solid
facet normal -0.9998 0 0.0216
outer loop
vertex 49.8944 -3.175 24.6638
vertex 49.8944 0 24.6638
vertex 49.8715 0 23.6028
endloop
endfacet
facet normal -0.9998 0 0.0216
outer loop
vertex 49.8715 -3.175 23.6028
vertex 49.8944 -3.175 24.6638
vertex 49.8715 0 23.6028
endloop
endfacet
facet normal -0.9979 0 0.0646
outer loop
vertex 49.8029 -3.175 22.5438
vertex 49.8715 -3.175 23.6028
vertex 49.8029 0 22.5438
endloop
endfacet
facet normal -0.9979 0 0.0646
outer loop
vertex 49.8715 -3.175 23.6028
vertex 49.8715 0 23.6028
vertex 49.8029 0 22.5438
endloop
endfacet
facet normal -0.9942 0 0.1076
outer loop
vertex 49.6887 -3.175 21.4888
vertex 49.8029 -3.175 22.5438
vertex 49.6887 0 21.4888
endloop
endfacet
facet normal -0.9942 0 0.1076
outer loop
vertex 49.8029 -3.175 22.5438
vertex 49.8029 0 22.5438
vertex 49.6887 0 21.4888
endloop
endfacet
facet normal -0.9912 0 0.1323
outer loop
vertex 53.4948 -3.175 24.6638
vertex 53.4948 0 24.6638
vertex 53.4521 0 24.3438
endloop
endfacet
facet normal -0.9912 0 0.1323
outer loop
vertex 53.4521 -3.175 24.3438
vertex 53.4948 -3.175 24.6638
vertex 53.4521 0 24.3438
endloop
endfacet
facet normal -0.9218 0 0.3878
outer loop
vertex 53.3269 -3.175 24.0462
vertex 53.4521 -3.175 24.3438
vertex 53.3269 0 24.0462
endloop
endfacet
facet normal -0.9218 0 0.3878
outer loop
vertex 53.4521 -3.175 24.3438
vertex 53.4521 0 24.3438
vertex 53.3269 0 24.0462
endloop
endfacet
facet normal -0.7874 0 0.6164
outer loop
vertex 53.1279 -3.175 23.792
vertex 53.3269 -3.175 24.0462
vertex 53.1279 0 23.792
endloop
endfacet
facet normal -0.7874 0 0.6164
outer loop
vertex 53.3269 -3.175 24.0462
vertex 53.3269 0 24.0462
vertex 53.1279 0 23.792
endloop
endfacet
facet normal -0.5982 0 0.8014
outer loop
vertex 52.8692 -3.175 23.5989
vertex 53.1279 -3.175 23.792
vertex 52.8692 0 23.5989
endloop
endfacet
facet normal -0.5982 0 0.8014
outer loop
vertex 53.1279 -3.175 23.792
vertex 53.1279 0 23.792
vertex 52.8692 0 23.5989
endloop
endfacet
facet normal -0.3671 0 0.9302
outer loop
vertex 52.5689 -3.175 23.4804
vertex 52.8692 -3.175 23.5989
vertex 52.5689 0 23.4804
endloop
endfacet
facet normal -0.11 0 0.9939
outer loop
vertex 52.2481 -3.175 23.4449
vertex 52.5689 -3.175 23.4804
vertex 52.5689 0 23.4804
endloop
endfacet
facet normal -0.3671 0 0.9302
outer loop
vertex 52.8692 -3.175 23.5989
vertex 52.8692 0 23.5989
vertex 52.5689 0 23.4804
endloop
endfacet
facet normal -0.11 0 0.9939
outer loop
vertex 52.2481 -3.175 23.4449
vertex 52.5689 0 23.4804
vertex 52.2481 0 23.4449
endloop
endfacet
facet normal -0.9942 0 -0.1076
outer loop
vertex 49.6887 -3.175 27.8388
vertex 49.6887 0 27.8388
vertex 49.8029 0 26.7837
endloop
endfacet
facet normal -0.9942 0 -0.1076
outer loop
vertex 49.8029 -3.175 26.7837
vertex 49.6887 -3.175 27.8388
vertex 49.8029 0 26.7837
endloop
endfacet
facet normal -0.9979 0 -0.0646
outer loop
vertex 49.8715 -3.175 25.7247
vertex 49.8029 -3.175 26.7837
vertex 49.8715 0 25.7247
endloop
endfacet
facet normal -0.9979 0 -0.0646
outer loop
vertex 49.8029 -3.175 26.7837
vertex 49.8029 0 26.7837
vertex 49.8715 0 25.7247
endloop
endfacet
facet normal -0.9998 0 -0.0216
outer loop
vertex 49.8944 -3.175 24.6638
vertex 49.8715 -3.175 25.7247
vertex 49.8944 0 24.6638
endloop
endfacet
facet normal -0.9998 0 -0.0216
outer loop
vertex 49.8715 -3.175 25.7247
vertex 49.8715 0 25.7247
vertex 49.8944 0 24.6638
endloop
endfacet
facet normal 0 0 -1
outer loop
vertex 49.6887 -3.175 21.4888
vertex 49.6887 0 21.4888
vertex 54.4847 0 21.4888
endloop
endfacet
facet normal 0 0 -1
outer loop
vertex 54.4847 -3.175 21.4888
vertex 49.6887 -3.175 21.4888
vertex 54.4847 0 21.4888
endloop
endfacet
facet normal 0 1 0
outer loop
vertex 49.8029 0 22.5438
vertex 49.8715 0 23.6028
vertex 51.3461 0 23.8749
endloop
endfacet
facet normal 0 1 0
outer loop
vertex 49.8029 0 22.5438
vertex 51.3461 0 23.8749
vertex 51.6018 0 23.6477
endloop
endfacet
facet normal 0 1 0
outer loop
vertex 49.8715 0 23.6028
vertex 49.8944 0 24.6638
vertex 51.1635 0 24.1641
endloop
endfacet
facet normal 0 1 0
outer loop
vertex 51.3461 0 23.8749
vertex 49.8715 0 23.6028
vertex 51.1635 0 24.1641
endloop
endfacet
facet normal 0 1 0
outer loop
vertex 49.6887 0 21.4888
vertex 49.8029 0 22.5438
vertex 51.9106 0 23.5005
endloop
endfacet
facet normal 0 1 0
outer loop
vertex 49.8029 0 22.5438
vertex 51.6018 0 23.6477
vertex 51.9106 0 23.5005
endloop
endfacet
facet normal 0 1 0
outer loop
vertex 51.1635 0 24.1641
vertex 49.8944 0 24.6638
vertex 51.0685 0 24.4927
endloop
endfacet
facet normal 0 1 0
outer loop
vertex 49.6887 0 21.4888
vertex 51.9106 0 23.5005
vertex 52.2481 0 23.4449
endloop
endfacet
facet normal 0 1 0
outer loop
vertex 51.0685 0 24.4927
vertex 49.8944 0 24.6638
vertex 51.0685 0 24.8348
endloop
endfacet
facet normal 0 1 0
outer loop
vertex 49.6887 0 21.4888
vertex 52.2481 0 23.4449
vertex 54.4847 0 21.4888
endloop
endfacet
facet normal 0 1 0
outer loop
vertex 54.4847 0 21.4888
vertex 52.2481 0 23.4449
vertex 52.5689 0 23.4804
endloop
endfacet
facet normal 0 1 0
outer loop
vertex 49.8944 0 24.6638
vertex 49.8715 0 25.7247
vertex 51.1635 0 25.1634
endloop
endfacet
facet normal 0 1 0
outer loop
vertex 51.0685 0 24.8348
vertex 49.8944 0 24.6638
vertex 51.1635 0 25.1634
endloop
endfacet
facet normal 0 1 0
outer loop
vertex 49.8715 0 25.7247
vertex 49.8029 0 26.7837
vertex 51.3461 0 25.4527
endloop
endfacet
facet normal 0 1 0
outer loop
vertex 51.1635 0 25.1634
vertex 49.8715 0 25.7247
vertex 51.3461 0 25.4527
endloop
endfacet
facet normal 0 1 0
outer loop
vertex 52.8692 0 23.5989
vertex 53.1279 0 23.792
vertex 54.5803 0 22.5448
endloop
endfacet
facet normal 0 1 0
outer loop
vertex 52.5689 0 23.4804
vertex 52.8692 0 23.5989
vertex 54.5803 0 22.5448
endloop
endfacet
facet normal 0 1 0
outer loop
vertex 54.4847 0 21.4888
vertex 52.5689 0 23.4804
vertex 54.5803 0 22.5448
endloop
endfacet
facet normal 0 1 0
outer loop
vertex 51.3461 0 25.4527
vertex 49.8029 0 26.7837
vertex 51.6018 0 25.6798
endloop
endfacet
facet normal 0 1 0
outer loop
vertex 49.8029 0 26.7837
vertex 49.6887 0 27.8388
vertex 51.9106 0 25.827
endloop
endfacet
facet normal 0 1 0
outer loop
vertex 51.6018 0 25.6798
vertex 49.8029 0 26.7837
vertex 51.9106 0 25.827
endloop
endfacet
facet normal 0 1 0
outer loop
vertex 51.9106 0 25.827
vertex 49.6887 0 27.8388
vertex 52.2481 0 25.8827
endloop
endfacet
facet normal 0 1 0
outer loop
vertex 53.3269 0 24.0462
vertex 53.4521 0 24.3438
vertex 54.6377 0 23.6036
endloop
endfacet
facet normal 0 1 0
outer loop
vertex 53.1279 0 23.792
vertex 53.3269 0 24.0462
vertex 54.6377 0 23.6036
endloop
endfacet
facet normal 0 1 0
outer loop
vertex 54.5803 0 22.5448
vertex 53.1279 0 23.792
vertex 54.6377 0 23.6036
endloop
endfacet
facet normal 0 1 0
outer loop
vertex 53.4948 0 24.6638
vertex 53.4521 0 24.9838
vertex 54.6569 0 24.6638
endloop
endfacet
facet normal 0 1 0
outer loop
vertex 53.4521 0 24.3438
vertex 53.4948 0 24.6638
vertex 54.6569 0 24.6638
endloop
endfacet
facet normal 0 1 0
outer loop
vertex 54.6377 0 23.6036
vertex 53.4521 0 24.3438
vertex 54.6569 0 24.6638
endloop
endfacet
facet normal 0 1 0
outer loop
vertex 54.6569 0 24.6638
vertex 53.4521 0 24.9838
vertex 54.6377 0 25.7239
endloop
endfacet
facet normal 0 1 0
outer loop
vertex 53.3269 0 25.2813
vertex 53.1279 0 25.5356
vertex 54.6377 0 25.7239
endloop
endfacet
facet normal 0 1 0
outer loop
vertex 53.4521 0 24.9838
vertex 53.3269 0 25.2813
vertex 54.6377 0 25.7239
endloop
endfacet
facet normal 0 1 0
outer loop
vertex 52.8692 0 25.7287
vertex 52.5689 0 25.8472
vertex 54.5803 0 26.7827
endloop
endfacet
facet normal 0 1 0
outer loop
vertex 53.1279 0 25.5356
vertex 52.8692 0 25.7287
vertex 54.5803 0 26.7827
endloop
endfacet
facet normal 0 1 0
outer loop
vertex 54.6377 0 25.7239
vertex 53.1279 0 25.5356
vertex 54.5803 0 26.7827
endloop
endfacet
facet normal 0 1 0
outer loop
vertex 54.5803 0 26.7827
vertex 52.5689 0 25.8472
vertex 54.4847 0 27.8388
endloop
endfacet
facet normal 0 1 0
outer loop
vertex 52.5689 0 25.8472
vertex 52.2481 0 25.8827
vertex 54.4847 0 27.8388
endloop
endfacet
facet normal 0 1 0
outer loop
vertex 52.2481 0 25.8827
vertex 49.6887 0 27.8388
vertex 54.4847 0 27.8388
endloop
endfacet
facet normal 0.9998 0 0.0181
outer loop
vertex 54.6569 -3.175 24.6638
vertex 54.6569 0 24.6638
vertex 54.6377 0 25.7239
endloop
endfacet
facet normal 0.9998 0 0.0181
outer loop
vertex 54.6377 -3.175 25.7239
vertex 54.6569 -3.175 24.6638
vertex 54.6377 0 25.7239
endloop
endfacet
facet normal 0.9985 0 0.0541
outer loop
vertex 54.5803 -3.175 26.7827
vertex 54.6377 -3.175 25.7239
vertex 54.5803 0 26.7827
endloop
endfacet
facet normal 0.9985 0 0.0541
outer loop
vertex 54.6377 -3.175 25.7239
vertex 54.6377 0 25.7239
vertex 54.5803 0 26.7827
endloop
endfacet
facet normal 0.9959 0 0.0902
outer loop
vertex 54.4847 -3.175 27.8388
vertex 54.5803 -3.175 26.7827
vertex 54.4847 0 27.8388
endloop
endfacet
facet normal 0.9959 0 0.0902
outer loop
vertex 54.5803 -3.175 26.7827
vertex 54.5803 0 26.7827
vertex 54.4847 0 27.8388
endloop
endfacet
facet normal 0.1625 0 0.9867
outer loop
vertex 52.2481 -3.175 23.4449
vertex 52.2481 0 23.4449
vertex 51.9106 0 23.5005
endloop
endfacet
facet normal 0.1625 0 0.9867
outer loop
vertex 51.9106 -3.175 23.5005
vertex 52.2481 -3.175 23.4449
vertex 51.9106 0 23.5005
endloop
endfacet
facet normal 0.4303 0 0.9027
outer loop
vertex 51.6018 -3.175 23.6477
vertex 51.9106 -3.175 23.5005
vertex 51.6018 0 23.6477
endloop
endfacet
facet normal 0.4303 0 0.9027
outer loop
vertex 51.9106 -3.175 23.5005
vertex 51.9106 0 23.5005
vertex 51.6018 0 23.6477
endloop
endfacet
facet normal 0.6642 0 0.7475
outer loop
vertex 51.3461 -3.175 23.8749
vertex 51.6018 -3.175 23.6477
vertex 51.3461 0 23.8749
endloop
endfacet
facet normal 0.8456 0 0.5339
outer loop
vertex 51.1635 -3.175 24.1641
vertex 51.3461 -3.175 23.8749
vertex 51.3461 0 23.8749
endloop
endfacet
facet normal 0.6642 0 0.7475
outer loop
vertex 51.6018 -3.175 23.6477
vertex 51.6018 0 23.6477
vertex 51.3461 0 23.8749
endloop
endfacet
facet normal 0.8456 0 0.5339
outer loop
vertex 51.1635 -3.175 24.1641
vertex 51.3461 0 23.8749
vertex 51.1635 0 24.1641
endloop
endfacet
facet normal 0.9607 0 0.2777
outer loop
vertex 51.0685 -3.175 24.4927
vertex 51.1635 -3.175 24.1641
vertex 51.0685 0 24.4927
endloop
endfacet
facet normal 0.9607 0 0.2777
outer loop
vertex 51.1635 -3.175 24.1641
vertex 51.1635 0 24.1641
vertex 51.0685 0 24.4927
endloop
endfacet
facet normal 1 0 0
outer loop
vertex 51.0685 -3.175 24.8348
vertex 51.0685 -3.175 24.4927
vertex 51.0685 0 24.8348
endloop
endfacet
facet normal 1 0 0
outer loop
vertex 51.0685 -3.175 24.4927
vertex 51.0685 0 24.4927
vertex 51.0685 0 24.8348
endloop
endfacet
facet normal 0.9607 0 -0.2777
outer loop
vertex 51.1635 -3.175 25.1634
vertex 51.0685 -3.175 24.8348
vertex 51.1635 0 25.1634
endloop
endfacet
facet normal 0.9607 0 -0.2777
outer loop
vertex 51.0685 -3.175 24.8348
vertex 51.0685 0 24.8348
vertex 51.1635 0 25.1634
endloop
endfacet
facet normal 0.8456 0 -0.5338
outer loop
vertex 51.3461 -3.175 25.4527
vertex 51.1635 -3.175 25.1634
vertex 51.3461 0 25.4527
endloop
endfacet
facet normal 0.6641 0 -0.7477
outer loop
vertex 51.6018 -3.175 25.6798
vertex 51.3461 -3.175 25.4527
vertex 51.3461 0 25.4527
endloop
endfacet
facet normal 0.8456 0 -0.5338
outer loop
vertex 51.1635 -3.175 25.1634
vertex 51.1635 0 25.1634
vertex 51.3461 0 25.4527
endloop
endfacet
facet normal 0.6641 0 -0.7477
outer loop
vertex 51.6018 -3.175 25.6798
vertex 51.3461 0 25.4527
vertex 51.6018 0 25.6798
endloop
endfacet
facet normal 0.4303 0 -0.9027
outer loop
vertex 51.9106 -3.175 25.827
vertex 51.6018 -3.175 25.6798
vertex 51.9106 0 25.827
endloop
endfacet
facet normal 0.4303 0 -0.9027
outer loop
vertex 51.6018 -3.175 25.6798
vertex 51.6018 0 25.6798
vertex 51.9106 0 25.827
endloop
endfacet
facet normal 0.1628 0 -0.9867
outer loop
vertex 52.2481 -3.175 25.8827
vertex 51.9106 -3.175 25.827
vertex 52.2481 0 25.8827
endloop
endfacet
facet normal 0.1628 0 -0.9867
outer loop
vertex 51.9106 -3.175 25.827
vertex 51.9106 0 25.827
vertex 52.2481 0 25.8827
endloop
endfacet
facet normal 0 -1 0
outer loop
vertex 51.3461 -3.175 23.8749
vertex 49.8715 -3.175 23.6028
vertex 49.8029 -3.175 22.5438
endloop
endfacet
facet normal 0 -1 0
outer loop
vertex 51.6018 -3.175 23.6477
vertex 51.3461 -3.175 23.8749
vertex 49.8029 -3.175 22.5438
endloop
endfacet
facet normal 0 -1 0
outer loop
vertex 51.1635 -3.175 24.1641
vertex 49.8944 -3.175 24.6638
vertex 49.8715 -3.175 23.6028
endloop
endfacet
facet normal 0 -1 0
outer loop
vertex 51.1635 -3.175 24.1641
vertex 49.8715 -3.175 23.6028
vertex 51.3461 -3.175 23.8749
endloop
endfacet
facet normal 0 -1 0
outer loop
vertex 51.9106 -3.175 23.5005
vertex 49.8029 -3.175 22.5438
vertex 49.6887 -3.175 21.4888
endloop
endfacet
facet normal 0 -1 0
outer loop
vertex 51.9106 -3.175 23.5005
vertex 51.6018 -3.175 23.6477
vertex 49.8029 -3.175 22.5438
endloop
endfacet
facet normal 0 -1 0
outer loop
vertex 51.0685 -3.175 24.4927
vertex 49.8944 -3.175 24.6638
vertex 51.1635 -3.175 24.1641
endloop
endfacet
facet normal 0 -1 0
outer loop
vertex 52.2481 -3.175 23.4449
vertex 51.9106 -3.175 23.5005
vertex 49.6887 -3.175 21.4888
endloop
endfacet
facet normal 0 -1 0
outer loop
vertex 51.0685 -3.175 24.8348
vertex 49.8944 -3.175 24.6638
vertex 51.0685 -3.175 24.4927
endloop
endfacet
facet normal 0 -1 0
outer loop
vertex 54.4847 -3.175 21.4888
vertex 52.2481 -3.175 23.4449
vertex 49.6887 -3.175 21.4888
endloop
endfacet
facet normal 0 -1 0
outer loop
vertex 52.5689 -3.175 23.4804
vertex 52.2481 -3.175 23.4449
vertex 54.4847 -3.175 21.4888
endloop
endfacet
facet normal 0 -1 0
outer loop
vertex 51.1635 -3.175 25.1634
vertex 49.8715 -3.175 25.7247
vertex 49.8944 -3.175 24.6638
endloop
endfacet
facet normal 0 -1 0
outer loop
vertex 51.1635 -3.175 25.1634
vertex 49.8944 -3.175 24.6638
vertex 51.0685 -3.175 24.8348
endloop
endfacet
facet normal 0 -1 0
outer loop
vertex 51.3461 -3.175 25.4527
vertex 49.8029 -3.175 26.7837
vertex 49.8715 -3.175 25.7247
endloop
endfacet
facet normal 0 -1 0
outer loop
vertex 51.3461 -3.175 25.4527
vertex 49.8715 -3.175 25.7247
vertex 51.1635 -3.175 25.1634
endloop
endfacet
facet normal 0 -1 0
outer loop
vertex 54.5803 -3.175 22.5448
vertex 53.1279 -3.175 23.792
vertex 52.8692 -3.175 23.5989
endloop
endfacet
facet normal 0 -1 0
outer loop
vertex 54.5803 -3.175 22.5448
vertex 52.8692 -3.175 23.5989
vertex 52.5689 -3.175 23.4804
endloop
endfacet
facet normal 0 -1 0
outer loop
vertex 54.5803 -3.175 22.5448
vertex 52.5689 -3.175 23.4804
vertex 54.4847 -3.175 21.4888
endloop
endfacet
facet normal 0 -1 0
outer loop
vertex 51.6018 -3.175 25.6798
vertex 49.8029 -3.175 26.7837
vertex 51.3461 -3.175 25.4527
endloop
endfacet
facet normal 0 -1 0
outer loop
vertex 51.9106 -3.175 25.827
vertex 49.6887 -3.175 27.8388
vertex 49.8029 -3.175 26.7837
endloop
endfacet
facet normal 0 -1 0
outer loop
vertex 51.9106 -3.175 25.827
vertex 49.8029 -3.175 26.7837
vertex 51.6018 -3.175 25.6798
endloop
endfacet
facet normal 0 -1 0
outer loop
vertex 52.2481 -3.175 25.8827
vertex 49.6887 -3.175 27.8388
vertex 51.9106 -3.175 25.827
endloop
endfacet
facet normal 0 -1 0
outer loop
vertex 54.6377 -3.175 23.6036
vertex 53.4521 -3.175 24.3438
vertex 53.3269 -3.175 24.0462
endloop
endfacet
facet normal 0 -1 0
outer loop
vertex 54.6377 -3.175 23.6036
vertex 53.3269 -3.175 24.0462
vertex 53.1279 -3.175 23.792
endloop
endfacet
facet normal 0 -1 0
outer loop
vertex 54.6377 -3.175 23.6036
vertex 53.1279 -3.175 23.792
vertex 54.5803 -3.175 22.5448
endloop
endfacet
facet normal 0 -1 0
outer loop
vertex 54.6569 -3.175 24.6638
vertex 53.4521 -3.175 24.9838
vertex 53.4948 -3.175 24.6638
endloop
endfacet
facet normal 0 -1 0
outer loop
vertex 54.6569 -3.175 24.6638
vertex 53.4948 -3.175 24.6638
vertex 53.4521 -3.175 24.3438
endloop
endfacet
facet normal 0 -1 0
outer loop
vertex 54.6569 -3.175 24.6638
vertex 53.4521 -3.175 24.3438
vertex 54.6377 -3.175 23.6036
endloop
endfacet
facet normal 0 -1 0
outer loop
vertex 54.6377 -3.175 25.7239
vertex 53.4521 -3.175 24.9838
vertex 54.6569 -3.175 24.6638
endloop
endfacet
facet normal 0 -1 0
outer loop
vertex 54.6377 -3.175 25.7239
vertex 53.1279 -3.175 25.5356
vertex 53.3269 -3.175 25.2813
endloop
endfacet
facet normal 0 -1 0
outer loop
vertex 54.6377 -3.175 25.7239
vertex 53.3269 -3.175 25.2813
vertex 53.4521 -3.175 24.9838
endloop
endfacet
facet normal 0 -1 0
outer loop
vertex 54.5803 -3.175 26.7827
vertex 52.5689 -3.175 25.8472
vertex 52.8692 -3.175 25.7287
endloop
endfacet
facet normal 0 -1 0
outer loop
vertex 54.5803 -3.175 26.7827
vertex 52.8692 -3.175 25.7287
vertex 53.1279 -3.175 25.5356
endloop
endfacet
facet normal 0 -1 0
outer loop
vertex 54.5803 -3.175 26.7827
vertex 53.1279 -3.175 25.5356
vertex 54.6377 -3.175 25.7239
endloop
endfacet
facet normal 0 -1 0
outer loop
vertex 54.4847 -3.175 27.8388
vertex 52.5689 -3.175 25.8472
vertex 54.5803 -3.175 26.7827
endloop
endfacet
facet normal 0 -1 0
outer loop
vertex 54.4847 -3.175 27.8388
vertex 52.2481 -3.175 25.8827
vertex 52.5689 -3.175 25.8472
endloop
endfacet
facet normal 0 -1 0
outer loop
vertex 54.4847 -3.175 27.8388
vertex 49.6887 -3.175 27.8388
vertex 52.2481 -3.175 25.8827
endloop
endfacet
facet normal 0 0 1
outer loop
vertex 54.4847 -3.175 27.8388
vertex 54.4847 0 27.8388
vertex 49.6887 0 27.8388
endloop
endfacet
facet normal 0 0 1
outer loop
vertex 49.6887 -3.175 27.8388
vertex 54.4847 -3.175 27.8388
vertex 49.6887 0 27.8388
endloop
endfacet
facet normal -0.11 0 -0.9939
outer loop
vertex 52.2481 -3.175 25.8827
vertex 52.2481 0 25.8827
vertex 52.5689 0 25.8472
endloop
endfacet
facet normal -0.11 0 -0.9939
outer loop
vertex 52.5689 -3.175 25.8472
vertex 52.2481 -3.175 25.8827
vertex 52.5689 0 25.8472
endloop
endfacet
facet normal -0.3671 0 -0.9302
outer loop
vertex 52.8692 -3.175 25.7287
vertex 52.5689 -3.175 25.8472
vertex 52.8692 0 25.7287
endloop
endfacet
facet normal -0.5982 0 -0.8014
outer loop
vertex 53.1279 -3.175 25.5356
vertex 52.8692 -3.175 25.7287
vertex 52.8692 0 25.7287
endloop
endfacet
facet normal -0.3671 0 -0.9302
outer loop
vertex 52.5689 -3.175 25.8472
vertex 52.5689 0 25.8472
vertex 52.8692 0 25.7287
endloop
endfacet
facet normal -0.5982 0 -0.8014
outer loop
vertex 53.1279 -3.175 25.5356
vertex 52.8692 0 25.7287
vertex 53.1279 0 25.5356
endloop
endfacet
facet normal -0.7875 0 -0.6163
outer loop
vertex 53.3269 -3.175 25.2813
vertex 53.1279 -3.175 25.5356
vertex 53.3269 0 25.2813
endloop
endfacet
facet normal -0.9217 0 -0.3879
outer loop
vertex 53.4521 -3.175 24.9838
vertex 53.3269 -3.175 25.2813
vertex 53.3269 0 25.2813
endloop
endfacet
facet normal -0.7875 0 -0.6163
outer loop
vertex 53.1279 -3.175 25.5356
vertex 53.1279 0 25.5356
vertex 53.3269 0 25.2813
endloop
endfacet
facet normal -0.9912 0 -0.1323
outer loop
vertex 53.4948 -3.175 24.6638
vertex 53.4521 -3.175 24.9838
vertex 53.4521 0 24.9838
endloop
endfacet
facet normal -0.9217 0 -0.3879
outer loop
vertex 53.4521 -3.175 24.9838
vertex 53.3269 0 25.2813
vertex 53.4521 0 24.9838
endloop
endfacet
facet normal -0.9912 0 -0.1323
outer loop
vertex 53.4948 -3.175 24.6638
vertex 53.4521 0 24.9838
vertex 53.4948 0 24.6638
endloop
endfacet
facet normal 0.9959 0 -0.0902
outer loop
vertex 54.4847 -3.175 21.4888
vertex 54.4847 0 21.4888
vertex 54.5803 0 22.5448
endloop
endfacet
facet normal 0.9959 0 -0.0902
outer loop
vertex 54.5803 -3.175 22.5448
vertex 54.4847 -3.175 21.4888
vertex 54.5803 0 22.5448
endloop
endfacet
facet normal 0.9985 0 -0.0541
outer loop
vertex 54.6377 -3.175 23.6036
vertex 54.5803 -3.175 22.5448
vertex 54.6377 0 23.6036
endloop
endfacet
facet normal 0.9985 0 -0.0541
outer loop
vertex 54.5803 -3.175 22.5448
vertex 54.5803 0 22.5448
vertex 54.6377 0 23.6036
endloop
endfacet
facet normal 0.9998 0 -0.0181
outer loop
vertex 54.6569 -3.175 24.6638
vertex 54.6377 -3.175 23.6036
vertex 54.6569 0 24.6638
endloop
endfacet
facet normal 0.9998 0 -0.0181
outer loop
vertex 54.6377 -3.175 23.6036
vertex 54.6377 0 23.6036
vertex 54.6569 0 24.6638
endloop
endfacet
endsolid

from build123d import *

# Parameters (mm, degrees)
F1_DEPTH = 3.175


with BuildPart() as f1:
    # F0 (on Front) → F1 (new body)
    with BuildSketch(Plane.XZ):
        with BuildLine():
            Line((54.4847436749, 27.8387732587), (52.0882042376, 27.8387732587))
            ThreePointArc((52.0882042376, 27.8387732587), (52.1859300417, 26.8621715497), (52.248080123, 25.8826621838))
            ThreePointArc((52.248080123, 25.8826621838), (53.1279319628, 25.5355601855), (53.4948196995, 24.6637732587))
            ThreePointArc((53.4948196995, 24.6637732587), (53.1279319628, 23.7919863318), (52.248080123, 23.4448843336))
            ThreePointArc((52.248080123, 23.4448843336), (52.1859300417, 22.4653749676), (52.0882042376, 21.4887732587))
            Line((52.0882042376, 21.4887732587), (54.4847436749, 21.4887732587))
            ThreePointArc((54.4847436749, 21.4887732587), (54.6138066219, 23.0739421066), (54.6568696995, 24.6637732587))
            ThreePointArc((54.6568696995, 24.6637732587), (54.6138066219, 26.2536044107), (54.4847436749, 27.8387732587))
        make_face()
        with BuildLine():
            ThreePointArc((49.6886712109, 27.8387732587), (49.8428912286, 26.2546014131), (49.8943696995, 24.6637732587))
            ThreePointArc((49.8943696995, 24.6637732587), (49.8428912286, 23.0729451042), (49.6886712109, 21.4887732587))
            Line((49.6886712109, 21.4887732587), (52.0882042376, 21.4887732587))
            ThreePointArc((52.0882042376, 21.4887732587), (52.1859300417, 22.4653749676), (52.248080123, 23.4448843336))
            ThreePointArc((52.248080123, 23.4448843336), (51.0564196995, 24.6637732587), (52.248080123, 25.8826621838))
            ThreePointArc((52.248080123, 25.8826621838), (52.1859300417, 26.8621715497), (52.0882042376, 27.8387732587))
            Line((52.0882042376, 27.8387732587), (49.6886712109, 27.8387732587))
        make_face()
    extrude(amount=F1_DEPTH)


solid = f1.part
